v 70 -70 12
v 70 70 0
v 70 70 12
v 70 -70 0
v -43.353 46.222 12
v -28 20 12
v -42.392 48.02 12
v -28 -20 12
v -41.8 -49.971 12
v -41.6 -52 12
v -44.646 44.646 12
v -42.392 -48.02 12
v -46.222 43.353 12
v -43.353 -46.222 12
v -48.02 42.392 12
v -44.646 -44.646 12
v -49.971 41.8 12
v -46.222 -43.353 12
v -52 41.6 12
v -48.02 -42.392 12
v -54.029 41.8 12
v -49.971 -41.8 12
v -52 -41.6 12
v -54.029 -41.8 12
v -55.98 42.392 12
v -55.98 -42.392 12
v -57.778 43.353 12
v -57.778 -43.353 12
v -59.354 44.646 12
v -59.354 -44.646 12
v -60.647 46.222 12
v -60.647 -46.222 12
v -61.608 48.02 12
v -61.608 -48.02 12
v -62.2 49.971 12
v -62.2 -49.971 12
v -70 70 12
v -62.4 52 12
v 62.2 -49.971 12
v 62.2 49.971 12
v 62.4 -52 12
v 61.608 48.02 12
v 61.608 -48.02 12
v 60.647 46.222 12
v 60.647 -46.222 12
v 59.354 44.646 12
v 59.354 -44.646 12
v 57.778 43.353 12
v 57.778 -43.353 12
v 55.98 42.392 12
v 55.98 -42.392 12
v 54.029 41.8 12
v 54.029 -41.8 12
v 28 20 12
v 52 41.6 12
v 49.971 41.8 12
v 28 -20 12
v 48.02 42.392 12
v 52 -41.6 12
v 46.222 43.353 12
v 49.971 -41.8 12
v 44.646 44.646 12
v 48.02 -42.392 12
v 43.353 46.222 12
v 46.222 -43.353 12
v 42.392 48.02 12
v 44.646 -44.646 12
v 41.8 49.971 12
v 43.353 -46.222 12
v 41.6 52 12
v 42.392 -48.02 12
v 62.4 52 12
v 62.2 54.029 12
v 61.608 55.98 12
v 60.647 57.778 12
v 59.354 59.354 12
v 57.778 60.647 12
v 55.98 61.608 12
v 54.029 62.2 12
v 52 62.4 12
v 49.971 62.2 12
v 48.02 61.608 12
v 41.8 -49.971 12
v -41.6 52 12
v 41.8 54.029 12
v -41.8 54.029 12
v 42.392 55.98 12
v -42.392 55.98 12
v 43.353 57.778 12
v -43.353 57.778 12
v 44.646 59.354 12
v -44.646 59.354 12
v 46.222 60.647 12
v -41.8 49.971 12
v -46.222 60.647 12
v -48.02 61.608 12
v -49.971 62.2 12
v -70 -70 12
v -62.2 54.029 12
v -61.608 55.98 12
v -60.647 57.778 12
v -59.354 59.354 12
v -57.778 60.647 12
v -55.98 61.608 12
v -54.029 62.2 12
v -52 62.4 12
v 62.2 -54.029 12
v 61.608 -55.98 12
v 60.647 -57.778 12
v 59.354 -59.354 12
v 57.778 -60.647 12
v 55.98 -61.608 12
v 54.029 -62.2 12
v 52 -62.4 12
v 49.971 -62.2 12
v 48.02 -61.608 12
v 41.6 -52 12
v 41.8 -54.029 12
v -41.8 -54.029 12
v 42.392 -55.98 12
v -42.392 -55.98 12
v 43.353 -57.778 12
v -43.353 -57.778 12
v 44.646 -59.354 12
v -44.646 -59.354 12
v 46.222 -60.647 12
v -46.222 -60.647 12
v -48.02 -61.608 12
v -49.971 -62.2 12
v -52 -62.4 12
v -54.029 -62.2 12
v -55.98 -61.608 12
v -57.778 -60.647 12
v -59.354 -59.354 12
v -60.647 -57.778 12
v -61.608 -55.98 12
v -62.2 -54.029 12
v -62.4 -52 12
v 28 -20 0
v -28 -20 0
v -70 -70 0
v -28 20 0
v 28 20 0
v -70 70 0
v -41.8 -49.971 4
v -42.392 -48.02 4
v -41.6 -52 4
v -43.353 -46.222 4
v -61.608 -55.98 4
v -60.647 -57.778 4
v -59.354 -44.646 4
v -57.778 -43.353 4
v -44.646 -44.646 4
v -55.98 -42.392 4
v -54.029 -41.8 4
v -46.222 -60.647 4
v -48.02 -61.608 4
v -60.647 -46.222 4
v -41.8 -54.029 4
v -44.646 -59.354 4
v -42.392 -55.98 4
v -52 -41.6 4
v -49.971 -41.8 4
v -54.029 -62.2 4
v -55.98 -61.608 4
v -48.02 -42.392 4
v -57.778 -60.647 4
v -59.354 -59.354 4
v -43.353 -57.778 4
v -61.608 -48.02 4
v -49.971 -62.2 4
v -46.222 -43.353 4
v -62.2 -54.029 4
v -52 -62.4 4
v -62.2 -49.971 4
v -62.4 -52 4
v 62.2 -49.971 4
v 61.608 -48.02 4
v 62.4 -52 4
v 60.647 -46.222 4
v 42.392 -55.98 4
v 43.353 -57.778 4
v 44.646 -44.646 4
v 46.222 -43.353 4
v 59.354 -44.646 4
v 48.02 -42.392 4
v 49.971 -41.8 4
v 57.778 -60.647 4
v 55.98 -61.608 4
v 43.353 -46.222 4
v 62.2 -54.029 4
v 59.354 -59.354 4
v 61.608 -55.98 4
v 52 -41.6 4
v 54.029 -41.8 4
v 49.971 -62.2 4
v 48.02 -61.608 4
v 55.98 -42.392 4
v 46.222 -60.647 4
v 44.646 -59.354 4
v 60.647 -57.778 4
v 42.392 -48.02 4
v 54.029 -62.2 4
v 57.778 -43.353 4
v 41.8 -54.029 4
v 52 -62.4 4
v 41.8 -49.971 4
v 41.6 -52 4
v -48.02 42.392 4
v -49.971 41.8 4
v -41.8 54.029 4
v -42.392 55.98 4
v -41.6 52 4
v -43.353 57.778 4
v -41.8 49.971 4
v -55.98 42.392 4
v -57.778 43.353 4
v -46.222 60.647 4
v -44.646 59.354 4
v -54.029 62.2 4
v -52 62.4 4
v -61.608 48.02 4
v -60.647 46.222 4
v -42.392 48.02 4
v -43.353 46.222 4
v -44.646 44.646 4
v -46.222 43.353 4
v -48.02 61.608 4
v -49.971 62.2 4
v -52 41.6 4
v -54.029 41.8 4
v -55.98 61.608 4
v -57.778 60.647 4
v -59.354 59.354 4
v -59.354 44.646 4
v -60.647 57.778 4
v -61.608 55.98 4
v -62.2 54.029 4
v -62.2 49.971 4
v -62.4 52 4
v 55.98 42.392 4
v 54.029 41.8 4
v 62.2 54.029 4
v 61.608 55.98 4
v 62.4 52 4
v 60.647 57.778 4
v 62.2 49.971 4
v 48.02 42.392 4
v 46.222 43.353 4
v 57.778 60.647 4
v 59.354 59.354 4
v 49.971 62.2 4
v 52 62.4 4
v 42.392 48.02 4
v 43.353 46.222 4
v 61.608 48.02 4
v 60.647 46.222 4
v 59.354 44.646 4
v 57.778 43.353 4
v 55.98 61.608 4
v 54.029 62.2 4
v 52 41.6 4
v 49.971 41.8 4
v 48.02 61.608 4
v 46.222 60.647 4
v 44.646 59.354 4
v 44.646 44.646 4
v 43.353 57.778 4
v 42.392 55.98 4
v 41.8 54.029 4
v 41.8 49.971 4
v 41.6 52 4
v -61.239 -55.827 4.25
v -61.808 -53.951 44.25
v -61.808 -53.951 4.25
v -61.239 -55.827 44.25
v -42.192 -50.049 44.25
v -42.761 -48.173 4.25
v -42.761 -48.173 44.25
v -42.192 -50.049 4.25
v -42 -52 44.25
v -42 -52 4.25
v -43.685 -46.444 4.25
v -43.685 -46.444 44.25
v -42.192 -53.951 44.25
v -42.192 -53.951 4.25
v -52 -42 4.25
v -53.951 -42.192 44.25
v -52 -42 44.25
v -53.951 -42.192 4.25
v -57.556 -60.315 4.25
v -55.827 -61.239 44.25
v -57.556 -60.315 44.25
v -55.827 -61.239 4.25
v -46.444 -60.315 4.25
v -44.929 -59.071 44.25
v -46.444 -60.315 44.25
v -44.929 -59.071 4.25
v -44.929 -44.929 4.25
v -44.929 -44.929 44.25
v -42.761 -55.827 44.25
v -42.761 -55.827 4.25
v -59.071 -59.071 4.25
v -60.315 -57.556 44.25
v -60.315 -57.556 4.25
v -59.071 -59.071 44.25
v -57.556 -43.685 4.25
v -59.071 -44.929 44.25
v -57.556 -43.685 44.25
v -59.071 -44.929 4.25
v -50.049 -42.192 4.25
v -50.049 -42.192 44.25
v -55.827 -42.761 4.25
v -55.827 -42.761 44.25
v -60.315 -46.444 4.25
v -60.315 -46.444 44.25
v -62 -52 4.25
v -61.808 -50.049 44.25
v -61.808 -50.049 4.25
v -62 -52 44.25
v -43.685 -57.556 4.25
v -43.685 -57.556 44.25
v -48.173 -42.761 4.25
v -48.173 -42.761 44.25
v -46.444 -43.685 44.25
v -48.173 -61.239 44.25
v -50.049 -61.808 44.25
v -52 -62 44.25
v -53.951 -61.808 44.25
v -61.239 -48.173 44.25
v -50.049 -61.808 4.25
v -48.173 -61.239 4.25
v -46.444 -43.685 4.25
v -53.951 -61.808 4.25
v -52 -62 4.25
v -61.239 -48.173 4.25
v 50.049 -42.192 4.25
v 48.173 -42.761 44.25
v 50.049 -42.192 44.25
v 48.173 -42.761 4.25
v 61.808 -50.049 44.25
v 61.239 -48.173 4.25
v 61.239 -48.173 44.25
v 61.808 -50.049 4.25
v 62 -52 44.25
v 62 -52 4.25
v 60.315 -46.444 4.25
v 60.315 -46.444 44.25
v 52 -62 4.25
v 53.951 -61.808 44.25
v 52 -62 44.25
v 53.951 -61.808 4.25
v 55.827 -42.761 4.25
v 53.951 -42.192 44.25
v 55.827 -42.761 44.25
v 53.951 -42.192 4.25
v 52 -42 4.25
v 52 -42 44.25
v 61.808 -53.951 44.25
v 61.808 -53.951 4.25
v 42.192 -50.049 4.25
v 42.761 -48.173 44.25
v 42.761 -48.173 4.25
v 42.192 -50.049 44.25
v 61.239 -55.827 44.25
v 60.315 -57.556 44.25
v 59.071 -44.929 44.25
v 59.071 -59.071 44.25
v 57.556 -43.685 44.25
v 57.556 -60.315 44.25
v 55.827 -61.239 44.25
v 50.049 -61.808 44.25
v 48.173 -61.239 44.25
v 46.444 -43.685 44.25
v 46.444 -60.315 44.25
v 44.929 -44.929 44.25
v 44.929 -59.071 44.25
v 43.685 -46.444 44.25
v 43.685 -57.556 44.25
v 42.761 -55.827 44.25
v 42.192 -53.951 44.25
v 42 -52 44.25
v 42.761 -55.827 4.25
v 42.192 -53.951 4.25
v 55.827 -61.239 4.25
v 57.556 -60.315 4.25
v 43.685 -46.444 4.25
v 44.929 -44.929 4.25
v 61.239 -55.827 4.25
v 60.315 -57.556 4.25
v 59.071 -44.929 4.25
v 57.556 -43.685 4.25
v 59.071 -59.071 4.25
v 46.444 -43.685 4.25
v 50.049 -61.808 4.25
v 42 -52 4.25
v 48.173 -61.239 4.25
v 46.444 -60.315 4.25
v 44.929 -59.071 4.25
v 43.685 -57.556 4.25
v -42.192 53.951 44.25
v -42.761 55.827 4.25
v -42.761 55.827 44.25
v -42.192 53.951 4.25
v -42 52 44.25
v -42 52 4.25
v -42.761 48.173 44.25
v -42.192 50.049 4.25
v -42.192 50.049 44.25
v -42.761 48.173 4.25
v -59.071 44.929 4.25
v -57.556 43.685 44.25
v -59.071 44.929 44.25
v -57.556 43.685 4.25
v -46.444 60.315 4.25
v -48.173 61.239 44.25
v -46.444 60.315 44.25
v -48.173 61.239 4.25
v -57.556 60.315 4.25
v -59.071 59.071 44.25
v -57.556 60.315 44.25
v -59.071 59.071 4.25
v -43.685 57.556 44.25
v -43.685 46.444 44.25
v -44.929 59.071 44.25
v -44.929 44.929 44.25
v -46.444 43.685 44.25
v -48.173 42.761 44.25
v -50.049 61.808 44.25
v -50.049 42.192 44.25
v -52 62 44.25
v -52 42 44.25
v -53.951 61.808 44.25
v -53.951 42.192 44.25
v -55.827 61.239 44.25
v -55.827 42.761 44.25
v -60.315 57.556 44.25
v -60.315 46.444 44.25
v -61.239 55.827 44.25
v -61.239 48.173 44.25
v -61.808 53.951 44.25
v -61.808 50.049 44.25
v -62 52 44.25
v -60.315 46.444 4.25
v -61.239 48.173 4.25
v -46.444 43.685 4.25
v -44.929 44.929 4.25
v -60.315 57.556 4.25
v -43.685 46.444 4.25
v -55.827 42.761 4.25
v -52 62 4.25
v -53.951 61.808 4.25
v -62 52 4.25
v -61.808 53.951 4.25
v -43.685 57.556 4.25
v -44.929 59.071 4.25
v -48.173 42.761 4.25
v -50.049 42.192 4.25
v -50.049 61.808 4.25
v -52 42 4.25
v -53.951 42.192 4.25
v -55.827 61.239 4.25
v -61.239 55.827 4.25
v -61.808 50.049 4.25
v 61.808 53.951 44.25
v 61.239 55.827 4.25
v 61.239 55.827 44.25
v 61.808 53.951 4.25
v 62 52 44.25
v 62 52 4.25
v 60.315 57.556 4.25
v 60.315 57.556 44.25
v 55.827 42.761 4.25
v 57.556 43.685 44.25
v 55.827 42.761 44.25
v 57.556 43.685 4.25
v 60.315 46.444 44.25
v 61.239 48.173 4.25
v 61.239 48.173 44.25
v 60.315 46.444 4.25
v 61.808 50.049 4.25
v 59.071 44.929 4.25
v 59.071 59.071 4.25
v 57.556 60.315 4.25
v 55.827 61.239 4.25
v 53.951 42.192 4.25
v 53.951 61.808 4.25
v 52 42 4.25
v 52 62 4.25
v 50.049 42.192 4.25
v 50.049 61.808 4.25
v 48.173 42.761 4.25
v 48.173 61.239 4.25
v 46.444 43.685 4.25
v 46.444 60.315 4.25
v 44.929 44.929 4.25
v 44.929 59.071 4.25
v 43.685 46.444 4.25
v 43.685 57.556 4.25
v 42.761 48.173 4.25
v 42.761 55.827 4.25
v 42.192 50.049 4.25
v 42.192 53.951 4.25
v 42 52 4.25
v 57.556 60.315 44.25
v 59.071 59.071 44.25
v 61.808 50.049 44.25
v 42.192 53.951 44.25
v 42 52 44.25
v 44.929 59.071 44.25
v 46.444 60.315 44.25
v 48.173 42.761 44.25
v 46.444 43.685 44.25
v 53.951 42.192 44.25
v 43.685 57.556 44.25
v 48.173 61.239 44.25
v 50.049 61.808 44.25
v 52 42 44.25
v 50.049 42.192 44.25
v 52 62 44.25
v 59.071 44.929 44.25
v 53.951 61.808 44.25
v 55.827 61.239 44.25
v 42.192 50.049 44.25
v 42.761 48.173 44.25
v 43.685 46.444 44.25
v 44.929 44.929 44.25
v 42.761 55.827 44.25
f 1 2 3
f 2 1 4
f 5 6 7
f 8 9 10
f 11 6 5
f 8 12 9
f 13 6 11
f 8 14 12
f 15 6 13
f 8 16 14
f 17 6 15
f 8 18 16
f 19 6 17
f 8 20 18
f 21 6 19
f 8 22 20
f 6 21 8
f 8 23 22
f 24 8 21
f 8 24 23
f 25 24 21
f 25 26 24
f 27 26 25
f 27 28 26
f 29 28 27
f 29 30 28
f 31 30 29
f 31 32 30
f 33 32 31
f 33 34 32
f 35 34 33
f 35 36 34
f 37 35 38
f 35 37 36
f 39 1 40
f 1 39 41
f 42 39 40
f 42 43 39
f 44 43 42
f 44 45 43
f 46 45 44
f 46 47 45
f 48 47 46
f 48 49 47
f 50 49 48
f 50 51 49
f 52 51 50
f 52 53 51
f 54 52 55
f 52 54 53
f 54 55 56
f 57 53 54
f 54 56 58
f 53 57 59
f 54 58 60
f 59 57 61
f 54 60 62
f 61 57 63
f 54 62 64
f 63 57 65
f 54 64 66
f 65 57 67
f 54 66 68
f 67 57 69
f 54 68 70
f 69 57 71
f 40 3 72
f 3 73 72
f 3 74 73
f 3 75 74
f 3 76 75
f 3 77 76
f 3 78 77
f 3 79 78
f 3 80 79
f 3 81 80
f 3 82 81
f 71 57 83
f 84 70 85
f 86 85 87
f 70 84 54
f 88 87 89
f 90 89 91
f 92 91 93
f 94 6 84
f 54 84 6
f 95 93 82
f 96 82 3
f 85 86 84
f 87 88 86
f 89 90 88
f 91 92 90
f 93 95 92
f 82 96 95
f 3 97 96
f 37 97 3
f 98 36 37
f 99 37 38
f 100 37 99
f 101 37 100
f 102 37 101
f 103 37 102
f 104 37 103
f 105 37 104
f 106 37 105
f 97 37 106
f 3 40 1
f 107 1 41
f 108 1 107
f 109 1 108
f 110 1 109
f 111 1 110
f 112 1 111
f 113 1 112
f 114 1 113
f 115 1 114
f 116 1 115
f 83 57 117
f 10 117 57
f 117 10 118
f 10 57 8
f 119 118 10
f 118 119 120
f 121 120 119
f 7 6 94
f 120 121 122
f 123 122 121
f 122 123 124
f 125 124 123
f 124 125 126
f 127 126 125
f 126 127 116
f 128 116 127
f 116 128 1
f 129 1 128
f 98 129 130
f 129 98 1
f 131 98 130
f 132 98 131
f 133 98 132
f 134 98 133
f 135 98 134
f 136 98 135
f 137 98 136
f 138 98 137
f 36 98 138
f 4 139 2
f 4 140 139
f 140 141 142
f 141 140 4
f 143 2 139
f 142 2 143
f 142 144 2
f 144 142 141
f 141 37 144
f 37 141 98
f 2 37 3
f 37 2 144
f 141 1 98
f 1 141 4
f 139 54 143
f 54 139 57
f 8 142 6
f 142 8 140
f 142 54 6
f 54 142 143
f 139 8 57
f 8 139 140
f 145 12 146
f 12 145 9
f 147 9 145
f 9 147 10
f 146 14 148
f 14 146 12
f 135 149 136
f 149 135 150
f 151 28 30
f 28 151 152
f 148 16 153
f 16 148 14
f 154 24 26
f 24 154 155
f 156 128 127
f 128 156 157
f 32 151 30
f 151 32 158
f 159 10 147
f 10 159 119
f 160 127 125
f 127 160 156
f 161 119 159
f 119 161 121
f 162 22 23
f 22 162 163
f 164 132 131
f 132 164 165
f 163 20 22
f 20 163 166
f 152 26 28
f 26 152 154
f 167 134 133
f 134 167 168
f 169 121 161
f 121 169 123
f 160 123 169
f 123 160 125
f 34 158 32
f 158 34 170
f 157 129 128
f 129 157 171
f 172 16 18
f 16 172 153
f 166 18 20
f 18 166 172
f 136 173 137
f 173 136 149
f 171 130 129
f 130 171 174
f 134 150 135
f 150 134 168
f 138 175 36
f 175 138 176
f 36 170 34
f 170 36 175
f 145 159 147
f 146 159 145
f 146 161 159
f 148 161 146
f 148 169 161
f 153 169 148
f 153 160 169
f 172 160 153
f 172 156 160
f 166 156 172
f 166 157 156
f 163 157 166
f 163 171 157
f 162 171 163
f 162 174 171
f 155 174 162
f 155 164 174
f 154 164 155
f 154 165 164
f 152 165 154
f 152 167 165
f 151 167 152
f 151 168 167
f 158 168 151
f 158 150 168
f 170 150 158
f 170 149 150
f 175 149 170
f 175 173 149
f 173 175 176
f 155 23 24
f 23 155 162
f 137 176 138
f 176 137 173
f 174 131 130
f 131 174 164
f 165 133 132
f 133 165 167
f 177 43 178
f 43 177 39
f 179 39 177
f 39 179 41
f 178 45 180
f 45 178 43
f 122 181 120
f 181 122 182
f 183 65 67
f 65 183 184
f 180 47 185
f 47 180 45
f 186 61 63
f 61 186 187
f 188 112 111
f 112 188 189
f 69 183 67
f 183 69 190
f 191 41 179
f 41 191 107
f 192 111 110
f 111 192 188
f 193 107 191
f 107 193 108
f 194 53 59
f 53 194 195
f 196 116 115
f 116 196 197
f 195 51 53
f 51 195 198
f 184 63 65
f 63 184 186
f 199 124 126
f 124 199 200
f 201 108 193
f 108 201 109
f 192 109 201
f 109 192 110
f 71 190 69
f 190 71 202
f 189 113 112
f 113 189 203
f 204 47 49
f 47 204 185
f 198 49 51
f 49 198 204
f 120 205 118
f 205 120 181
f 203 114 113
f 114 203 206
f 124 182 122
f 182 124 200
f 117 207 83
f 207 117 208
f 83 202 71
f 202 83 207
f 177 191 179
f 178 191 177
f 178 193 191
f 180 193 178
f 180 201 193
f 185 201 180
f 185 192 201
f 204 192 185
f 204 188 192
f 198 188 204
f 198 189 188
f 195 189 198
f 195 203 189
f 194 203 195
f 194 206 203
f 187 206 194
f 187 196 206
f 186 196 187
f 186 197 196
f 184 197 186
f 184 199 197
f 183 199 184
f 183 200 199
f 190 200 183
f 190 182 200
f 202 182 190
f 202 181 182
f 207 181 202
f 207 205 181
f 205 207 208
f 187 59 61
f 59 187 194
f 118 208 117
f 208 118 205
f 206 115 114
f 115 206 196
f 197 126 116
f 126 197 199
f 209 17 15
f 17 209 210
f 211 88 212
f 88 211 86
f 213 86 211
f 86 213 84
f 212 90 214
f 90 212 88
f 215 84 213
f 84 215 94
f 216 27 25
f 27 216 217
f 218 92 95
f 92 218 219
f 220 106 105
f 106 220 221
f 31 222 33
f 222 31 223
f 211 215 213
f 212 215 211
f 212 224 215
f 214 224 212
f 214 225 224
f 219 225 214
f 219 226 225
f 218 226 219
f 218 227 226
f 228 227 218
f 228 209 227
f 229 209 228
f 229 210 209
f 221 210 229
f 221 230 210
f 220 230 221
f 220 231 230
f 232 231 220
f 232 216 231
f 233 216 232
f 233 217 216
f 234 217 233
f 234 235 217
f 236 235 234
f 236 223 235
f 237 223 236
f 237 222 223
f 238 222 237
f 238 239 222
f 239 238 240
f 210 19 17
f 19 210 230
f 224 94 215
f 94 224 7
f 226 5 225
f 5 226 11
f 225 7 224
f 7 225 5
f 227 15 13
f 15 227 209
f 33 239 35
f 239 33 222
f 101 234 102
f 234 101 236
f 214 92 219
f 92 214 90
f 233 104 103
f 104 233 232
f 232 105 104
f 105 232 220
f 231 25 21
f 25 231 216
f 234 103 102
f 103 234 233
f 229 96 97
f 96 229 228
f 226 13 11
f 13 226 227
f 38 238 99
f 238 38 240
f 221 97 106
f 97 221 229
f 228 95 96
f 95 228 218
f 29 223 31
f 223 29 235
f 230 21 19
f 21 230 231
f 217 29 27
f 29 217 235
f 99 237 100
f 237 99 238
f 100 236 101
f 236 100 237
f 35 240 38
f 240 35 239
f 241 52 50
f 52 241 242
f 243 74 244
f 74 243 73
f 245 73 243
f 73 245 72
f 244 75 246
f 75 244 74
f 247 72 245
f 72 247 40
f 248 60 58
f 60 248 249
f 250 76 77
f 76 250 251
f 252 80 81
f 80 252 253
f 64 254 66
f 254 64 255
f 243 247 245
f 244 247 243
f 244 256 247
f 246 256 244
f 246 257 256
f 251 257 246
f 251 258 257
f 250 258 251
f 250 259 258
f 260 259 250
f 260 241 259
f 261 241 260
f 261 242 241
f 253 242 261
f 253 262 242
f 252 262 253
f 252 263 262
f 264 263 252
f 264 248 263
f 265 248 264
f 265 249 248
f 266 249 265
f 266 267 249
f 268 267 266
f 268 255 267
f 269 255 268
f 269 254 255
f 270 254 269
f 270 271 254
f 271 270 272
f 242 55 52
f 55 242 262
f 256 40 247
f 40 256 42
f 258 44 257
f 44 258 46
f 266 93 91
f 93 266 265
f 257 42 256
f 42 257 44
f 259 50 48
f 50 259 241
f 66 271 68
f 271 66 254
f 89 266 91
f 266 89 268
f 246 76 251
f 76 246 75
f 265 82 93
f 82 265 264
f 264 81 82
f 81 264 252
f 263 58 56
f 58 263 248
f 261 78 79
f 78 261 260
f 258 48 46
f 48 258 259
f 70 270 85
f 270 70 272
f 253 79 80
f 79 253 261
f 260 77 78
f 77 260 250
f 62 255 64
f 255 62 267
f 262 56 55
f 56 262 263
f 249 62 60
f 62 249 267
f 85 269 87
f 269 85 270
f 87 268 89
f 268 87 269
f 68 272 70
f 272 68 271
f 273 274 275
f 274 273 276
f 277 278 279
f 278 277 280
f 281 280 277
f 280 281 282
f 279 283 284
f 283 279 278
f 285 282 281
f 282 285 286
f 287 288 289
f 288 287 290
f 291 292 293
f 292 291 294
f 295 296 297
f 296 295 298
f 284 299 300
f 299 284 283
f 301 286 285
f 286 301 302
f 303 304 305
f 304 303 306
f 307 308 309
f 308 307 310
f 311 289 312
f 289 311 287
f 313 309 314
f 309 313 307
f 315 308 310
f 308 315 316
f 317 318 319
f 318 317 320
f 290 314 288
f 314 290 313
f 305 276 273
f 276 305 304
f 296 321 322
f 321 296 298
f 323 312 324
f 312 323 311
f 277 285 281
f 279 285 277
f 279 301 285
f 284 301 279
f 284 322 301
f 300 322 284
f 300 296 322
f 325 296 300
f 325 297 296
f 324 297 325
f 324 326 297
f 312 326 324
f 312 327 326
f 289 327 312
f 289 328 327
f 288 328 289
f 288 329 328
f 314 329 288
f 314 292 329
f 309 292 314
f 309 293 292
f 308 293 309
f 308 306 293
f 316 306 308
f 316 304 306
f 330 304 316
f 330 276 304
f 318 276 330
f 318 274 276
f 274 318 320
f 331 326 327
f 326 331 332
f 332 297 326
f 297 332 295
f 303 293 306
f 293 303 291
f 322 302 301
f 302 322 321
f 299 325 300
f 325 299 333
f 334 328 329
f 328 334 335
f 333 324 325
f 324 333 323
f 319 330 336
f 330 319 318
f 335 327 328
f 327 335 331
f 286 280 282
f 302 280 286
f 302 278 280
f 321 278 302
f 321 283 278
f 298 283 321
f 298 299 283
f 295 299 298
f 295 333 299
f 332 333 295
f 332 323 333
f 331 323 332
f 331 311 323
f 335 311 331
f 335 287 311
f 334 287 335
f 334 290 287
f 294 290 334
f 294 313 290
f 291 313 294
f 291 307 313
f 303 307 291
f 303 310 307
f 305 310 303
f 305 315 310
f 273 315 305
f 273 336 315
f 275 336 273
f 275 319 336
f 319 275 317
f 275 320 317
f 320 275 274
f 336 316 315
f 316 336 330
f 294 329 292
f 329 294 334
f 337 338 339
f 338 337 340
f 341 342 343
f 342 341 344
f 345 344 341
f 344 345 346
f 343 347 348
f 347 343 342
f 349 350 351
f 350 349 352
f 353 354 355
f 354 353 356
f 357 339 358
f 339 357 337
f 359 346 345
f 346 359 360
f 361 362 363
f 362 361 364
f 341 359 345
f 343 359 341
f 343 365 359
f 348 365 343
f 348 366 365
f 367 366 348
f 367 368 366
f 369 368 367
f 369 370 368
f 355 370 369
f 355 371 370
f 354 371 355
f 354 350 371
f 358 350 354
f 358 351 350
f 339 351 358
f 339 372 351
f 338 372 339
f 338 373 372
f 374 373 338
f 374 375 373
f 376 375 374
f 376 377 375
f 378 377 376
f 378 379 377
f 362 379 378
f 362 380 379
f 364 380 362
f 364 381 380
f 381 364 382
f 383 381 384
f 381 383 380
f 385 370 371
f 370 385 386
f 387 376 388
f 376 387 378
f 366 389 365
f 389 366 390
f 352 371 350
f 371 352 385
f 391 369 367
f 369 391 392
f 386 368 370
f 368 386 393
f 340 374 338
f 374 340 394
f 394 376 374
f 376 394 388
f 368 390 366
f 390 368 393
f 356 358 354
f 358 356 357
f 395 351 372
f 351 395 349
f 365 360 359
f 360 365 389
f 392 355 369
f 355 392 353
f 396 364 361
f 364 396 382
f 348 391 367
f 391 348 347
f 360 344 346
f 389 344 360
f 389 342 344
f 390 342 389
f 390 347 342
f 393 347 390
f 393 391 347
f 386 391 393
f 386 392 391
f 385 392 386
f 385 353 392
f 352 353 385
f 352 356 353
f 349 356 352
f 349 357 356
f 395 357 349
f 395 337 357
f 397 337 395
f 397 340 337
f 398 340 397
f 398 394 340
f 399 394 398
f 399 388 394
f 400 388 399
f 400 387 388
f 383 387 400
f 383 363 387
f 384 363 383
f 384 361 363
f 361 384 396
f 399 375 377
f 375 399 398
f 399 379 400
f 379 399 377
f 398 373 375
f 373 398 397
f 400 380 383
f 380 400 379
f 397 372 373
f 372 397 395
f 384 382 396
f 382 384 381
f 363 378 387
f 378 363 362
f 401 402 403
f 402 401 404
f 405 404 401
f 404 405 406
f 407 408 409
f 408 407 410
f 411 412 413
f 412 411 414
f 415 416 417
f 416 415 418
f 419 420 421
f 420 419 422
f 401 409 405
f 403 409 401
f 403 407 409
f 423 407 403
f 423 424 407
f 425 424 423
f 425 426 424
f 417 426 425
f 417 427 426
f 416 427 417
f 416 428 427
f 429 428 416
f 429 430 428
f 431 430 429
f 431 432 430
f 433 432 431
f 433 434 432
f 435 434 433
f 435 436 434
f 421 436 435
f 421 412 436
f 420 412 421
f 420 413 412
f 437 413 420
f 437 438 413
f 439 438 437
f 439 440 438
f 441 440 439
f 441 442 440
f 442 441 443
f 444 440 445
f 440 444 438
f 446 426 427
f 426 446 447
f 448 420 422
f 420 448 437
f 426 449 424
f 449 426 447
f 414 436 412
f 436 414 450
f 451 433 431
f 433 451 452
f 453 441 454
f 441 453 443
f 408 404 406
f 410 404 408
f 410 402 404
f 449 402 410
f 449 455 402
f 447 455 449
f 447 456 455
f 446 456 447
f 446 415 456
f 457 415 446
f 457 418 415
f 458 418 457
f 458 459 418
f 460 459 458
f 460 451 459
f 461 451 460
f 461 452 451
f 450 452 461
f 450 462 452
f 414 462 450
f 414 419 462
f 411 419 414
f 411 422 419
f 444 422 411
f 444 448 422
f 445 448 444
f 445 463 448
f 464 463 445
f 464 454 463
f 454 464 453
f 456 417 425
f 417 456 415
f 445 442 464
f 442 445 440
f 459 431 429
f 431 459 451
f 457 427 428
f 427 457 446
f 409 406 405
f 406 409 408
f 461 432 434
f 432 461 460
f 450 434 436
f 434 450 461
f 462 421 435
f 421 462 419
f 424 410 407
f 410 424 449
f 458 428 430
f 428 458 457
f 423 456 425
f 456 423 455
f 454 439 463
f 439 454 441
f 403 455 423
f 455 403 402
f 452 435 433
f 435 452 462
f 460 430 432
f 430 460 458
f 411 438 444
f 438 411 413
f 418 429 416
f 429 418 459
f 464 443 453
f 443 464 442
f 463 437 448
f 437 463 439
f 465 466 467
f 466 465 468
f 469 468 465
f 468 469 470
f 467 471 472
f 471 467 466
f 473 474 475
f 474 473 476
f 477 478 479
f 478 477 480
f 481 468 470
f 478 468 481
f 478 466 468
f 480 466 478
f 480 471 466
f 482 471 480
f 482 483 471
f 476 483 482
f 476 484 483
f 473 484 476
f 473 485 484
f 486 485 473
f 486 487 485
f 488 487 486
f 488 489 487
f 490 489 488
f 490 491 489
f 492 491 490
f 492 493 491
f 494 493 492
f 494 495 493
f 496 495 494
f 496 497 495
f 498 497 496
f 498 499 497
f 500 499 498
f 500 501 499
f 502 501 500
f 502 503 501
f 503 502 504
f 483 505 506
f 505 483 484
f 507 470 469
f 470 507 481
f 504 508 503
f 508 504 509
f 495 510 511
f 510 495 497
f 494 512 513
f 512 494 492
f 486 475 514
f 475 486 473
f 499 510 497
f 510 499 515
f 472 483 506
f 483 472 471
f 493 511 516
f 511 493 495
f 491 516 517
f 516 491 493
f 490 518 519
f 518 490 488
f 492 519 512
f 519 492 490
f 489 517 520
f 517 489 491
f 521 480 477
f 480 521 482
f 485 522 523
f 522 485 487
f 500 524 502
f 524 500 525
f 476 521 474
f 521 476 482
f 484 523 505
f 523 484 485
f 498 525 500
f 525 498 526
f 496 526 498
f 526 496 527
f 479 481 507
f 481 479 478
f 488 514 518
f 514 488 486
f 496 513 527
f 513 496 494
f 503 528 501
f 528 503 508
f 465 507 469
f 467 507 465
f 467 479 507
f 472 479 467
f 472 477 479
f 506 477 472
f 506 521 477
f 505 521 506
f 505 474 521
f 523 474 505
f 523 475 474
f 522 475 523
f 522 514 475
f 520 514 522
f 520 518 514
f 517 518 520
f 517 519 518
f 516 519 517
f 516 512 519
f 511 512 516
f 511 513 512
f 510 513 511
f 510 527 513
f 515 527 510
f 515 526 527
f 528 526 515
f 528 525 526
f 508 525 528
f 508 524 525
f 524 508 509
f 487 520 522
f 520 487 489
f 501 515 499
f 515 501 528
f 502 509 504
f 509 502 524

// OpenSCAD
$fn = 32;

// ------------------------------------------------------------------------
// Frame with four posts: 140 x 140 mm frame, four d20 posts
// Every part is its own module, assembly() places them once.
// ------------------------------------------------------------------------

// --- part 1 ---
module base_frame() {
  difference() {
    translate([-70, -70, 0]) cube([140, 140, 12]);
    translate([-28, -20, -1]) cube([56, 40, 14]);
    translate([-52, -52, 4]) cylinder(h = 9, d = 20.8);
    translate([52, -52, 4]) cylinder(h = 9, d = 20.8);
    translate([-52, 52, 4]) cylinder(h = 9, d = 20.8);
    translate([52, 52, 4]) cylinder(h = 9, d = 20.8);
  }
}

// --- part 2 ---
module post1() {
  cylinder(h = 40, d = 20);
}

// --- part 3 ---
module post2() {
  cylinder(h = 40, d = 20);
}

// --- part 4 ---
module post3() {
  cylinder(h = 40, d = 20);
}

// --- part 5 ---
module post4() {
  cylinder(h = 40, d = 20);
}

// --- assembly ---
module assembly() {
  translate([0, 0, 0]) rotate([0, 0, 0]) base_frame();
  translate([-52, -52, 4.25]) rotate([0, 0, 0]) post1();
  translate([52, -52, 4.25]) rotate([0, 0, 0]) post2();
  translate([-52, 52, 4.25]) rotate([0, 0, 0]) post3();
  translate([52, 52, 4.25]) rotate([0, 0, 0]) post4();
}

assembly();
